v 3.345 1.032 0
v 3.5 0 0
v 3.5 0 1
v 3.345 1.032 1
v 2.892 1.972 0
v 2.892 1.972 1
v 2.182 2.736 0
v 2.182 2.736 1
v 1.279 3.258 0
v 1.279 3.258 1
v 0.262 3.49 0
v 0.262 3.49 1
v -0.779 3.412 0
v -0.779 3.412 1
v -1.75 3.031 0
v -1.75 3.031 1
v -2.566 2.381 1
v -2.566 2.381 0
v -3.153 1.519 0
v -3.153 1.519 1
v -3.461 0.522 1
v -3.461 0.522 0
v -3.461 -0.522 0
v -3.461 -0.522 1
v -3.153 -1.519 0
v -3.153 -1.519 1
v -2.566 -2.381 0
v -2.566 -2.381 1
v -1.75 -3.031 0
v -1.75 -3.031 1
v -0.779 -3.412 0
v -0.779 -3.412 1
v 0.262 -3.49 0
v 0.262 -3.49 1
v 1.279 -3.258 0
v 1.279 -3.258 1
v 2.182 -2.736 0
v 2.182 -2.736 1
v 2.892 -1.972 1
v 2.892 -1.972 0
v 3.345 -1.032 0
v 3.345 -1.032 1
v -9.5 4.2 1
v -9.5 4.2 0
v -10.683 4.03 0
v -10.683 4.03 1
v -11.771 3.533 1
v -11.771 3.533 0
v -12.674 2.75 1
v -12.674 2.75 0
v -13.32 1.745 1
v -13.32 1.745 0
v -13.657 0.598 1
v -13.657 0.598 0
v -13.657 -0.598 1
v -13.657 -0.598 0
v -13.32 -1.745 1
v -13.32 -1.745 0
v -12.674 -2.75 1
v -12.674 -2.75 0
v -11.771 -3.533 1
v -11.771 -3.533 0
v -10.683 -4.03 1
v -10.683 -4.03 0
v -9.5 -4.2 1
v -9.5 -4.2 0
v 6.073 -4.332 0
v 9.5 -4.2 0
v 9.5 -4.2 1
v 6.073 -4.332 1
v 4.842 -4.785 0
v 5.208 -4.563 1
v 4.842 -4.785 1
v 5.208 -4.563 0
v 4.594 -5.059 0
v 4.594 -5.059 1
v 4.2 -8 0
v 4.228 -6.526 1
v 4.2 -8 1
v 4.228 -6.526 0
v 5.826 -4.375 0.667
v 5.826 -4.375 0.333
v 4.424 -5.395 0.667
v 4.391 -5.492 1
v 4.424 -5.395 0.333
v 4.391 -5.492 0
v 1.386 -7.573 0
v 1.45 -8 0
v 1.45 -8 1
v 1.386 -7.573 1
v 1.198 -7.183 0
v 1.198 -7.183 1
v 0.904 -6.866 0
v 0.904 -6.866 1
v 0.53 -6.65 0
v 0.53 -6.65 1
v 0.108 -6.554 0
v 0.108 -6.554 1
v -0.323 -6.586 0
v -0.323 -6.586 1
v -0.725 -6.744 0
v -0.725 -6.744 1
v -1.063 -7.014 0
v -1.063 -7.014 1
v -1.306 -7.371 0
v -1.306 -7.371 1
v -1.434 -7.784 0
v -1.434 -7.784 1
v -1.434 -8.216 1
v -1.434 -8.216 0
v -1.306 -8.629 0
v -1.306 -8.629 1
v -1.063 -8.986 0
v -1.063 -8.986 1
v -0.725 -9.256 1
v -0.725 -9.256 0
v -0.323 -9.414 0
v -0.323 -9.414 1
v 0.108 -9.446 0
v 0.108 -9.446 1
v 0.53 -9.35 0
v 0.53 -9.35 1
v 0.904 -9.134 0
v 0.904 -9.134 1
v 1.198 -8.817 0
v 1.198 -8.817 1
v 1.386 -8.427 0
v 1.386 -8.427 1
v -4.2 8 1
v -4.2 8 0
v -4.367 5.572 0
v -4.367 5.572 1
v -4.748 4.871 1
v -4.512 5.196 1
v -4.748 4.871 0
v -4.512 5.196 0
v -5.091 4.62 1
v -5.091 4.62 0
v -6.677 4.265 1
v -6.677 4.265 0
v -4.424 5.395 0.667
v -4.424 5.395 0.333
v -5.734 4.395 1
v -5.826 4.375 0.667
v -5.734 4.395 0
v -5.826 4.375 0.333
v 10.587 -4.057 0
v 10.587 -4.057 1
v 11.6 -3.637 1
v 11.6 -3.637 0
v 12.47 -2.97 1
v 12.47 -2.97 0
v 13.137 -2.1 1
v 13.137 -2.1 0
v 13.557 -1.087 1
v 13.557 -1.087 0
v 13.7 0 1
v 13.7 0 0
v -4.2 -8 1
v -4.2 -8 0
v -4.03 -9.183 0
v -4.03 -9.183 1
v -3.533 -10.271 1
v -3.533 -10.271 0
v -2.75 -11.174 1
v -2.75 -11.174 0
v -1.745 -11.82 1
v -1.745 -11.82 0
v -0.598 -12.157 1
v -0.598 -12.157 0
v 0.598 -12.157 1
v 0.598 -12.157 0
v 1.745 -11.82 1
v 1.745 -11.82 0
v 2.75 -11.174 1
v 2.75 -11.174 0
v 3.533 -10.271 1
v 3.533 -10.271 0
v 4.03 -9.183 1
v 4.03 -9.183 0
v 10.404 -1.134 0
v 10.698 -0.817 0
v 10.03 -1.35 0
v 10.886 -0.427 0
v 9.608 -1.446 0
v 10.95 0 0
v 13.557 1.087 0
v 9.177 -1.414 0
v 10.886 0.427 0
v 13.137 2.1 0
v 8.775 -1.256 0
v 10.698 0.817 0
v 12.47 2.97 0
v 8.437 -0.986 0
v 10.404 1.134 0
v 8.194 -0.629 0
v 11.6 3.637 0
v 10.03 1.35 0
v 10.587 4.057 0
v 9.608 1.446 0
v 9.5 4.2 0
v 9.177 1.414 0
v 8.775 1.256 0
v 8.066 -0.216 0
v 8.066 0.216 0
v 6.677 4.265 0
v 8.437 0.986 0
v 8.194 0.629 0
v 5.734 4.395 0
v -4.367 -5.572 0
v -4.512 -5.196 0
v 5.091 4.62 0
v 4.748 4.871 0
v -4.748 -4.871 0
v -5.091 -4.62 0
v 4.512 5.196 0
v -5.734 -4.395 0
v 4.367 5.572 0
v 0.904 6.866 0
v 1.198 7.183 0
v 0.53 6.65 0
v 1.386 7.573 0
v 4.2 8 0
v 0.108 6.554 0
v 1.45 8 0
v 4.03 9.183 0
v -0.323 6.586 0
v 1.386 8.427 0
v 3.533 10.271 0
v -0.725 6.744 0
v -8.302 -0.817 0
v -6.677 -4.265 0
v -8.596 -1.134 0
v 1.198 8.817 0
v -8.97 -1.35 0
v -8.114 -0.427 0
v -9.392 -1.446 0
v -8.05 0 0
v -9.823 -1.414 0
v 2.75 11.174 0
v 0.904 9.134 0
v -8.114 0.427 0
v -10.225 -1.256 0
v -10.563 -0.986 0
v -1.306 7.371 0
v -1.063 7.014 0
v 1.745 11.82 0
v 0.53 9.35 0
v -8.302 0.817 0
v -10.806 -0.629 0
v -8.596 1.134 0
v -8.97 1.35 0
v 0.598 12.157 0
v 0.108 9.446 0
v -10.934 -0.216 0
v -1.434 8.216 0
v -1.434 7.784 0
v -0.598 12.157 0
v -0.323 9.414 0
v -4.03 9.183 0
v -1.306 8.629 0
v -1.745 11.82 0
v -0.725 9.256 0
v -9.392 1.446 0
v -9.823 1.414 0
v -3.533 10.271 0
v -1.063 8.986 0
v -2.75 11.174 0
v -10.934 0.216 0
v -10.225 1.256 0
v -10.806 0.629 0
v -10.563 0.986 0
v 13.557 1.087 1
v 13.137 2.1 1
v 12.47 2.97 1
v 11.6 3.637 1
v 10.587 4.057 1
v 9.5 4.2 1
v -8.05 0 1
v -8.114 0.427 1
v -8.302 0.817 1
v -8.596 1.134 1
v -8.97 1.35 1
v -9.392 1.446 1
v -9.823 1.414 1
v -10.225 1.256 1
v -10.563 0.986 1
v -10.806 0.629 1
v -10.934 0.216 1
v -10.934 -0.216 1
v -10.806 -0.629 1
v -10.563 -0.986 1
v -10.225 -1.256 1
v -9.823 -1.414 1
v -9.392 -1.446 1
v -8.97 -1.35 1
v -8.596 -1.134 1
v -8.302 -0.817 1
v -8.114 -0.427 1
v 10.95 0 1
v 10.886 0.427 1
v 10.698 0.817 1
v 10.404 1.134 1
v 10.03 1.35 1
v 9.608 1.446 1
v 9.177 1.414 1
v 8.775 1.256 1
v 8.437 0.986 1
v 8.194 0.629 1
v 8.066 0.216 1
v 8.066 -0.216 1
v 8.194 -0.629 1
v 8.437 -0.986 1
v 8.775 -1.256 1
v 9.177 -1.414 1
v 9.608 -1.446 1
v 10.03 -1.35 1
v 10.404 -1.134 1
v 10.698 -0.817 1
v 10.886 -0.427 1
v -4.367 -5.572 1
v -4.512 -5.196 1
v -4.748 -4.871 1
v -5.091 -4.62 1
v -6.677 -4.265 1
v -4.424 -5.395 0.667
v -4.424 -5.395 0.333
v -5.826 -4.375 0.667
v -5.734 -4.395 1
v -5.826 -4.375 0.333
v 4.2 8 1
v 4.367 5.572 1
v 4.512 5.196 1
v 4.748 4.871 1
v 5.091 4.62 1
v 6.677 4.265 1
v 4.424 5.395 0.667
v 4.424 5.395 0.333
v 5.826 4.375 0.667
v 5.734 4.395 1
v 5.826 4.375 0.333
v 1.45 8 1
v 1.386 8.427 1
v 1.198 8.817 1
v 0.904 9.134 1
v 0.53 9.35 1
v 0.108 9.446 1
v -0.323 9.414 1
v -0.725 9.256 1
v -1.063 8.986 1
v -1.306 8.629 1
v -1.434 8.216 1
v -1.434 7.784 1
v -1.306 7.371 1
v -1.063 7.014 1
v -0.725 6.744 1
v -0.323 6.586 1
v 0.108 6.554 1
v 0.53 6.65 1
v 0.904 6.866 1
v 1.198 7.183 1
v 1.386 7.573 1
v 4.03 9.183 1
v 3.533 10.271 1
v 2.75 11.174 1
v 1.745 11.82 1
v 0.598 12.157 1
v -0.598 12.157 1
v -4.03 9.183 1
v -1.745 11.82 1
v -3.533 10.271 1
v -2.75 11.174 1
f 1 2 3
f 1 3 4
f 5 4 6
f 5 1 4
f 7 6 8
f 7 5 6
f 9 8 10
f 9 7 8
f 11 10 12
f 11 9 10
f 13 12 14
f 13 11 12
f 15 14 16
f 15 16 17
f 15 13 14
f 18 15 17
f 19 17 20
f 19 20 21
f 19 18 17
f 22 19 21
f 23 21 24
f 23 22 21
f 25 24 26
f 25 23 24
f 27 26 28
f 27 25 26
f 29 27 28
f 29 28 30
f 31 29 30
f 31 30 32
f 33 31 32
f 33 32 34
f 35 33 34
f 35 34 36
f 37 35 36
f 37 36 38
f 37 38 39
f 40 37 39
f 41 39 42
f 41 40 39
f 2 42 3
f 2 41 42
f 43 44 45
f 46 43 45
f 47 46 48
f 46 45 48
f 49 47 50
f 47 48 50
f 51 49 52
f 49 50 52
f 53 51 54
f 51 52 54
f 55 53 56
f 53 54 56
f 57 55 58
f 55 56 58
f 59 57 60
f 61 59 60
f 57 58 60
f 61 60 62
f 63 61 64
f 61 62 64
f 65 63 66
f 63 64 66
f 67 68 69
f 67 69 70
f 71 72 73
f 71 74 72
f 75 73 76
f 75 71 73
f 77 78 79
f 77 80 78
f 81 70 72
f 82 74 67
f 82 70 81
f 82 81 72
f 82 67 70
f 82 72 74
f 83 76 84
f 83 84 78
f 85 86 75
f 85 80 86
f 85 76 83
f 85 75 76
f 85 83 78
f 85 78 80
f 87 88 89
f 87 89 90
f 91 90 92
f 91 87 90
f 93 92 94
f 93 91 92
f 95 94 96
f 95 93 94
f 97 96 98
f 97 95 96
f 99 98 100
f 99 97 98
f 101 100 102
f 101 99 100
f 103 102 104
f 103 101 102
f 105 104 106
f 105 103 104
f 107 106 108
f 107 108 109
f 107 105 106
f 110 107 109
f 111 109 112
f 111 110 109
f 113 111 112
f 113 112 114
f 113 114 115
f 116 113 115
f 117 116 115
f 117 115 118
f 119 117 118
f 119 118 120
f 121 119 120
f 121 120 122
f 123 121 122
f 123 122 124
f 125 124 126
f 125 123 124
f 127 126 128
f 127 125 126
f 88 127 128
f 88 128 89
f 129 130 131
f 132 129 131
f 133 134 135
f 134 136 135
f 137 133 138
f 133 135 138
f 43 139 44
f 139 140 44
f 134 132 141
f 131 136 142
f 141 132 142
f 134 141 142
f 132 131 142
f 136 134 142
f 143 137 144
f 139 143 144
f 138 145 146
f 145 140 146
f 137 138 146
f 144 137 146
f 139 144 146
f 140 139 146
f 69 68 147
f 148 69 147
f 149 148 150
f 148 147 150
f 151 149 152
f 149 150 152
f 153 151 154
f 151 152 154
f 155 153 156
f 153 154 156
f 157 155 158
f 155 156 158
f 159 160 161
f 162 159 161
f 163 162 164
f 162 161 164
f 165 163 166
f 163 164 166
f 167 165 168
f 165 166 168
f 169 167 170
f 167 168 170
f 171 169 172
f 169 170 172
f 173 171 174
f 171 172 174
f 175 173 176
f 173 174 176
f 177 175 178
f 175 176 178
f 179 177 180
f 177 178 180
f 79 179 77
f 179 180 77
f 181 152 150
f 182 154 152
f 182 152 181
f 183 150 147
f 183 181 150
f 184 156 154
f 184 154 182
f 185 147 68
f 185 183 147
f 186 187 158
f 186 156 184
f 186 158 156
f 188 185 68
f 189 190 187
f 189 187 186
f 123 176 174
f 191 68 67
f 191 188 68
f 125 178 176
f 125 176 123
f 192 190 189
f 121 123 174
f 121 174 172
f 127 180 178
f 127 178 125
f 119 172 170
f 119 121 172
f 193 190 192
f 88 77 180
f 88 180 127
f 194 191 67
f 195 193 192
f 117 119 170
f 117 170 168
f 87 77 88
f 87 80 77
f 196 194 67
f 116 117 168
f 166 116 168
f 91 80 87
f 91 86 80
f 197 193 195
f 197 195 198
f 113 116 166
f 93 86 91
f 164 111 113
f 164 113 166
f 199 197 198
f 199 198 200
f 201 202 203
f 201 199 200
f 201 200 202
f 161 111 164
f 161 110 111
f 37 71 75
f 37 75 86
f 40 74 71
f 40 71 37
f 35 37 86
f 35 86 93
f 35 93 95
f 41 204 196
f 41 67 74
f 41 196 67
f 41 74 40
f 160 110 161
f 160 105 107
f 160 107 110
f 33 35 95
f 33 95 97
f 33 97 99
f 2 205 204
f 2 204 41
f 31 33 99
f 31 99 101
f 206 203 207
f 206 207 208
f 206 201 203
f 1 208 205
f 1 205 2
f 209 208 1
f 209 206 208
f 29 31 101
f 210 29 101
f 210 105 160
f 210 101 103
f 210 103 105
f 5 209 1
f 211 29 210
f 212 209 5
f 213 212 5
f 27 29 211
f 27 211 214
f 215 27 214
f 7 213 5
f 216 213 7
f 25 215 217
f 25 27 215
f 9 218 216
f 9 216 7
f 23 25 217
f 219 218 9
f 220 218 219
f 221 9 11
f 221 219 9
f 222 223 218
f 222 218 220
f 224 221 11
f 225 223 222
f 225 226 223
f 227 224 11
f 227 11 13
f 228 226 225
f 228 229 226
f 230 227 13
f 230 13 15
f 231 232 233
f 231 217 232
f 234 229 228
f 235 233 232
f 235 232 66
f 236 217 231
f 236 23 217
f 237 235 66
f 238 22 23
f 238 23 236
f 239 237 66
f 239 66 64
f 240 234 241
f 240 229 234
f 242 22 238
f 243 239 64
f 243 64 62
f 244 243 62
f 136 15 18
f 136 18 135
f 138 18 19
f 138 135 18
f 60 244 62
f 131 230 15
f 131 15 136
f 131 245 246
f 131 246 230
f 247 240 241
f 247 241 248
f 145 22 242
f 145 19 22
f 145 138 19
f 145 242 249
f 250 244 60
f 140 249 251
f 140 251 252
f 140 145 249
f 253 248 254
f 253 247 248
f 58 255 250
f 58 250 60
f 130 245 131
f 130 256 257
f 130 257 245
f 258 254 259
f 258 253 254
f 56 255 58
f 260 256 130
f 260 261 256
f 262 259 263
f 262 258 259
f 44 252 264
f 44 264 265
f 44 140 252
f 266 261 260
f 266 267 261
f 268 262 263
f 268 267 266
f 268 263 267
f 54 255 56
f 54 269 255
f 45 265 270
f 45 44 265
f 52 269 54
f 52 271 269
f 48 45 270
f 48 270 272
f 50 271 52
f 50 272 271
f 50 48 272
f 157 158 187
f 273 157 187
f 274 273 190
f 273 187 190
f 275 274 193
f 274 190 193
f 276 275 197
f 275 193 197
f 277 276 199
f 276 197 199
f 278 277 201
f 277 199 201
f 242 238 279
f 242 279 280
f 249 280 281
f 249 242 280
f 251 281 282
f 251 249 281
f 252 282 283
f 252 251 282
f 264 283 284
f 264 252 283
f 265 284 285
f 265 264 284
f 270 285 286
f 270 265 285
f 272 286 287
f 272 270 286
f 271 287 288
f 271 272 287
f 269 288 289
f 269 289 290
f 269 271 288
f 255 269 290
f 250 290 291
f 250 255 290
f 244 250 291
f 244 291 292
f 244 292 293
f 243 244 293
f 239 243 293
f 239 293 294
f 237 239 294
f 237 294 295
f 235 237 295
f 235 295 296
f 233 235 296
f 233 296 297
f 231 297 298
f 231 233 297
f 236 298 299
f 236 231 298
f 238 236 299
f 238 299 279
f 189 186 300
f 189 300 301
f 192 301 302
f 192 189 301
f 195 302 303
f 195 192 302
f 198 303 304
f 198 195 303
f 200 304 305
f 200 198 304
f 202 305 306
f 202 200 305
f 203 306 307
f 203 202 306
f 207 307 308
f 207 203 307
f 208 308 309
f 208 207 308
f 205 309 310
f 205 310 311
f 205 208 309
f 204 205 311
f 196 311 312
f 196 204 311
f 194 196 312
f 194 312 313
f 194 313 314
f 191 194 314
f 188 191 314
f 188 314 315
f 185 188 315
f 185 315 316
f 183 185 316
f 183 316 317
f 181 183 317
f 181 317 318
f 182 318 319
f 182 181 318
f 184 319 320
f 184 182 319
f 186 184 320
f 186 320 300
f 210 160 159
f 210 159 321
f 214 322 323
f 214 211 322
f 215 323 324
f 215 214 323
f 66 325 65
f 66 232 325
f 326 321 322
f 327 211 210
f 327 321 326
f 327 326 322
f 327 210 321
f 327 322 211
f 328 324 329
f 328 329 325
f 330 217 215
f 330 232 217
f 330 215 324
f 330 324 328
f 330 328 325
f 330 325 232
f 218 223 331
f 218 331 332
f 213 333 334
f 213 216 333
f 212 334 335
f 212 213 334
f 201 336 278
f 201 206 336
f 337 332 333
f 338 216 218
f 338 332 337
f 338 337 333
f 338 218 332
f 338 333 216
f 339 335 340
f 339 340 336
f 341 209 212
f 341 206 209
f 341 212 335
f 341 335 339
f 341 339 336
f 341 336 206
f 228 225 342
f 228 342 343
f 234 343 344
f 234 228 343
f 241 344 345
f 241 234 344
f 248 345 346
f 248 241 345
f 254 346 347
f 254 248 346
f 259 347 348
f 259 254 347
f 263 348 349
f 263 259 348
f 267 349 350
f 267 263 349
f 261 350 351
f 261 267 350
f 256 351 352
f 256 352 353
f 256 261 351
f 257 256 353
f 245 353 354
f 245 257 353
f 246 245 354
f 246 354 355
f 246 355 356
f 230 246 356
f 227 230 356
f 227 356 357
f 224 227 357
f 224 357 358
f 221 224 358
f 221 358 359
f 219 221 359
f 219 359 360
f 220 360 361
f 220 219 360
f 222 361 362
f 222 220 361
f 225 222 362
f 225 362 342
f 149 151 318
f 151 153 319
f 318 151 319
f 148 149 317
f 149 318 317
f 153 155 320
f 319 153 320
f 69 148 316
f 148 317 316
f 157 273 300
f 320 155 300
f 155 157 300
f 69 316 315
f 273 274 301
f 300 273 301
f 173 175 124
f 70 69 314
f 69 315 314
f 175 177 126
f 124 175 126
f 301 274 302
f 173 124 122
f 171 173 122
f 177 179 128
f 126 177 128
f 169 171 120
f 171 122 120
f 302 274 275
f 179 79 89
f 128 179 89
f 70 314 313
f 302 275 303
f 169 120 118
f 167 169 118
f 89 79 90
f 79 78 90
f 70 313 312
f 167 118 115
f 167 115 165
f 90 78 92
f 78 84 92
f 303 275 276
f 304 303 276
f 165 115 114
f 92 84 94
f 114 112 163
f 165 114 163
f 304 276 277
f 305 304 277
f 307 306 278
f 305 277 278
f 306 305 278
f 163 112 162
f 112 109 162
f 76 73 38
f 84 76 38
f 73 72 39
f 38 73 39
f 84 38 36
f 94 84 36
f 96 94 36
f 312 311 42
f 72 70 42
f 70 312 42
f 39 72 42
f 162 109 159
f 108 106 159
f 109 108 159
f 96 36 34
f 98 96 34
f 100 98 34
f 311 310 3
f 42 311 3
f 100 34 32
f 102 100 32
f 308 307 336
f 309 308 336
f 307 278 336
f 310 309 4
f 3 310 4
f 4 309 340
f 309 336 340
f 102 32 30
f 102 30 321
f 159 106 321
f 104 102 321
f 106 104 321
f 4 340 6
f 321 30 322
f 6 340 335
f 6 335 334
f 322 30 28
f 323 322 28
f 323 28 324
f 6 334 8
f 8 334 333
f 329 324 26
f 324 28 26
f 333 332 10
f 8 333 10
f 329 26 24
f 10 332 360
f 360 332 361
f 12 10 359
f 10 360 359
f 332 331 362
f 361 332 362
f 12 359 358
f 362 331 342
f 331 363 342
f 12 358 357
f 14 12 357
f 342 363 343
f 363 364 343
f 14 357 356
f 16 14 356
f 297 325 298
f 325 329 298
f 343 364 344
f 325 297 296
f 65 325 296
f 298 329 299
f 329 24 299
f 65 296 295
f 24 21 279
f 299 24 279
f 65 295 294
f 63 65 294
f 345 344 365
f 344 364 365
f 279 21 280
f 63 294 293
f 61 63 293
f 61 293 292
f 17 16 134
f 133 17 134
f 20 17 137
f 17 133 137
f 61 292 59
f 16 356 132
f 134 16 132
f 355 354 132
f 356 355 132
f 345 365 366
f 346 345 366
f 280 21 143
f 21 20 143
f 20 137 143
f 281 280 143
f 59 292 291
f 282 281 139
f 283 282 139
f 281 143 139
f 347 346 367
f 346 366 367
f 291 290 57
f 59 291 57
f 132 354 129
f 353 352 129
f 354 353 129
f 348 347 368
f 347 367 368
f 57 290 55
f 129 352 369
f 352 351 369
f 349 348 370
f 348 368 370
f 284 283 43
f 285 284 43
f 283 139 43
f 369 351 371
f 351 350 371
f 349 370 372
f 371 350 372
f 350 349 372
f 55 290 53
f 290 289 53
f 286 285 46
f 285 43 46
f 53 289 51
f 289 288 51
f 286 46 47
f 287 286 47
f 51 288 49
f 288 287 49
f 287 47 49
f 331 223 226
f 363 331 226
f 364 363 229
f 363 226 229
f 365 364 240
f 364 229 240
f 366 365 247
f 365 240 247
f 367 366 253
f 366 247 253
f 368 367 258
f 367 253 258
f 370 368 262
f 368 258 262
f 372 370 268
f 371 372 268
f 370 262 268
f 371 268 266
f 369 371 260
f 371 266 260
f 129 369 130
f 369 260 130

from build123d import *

# Parameters (mm, degrees)
F1_R     = 3.5
F1_R_2   = 3
F1_R_3   = 1.45
F2_DEPTH = 1


with BuildPart() as f2:
    # F1 (on Top) → F2 (new body)
    with BuildSketch(Plane.XY):
        with BuildLine():
            add(Edge.make_bspline(
                [(4.2, 8), (4.2, 4.3558003341), (4.3243523603, 4.2), (9.5, 4.2)],
                knots=[0, 0, 0, 0, 6.5215028943, 6.5215028943, 6.5215028943, 6.5215028943], degree=3))
            ThreePointArc((4.2, 8), (0, 3.8), (-4.2, 8))
            add(Edge.make_bspline(
                [(-4.2, 8), (-4.2, 4.3558003341), (-4.3243523603, 4.2), (-9.5, 4.2)],
                knots=[0, 0, 0, 0, 6.5215028943, 6.5215028943, 6.5215028943, 6.5215028943], degree=3))
            ThreePointArc((-9.5, 4.2), (-6.530151519, 2.969848481), (-5.3, 0))
            ThreePointArc((-5.3, 0), (-6.530151519, -2.969848481), (-9.5, -4.2))
            add(Edge.make_bspline(
                [(-4.2, -8), (-4.2, -4.3558003341), (-4.3243523603, -4.2), (-9.5, -4.2)],
                knots=[0, 0, 0, 0, 6.5215028943, 6.5215028943, 6.5215028943, 6.5215028943], degree=3))
            ThreePointArc((-4.2, -8), (0, -3.8), (4.2, -8))
            add(Edge.make_bspline(
                [(9.5, -4.2), (4.3243523603, -4.2), (4.2, -4.3558003341), (4.2, -8)],
                knots=[0, 0, 0, 0, 6.5215028943, 6.5215028943, 6.5215028943, 6.5215028943], degree=3))
            ThreePointArc((9.5, -4.2), (5.3, 0), (9.5, 4.2))
        make_face()
        Circle(F1_R, mode=Mode.SUBTRACT)
        with BuildLine():
            ThreePointArc((-5.3, 0), (-6.530151519, 2.969848481), (-9.5, 4.2))
            ThreePointArc((-9.5, 4.2), (-13.7, 0), (-9.5, -4.2))
            ThreePointArc((-9.5, -4.2), (-6.530151519, -2.969848481), (-5.3, 0))
        make_face()
        with Locations((-9.5, 0)):
            Circle(F1_R_2, mode=Mode.SUBTRACT)
        with BuildLine():
            ThreePointArc((-4.2, -8), (0, -12.2), (4.2, -8))
            ThreePointArc((4.2, -8), (0, -3.8), (-4.2, -8))
        make_face()
        with Locations((0, -8)):
            Circle(F1_R_2, mode=Mode.SUBTRACT)
        with BuildLine():
            ThreePointArc((13.7, 0), (12.469848481, 2.969848481), (9.5, 4.2))
            ThreePointArc((9.5, 4.2), (5.3, 0), (9.5, -4.2))
            ThreePointArc((9.5, -4.2), (12.469848481, -2.969848481), (13.7, 0))
        make_face()
        with Locations((9.5, 0)):
            Circle(F1_R_2, mode=Mode.SUBTRACT)
        with BuildLine():
            ThreePointArc((-4.2, 8), (0, 3.8), (4.2, 8))
            ThreePointArc((4.2, 8), (0, 12.2), (-4.2, 8))
        make_face()
        with Locations((0, 8)):
            Circle(F1_R_2, mode=Mode.SUBTRACT)
        with Locations((0, 8)):
            Circle(F1_R_2)
        with Locations((0, 8)):
            Circle(F1_R_3, mode=Mode.SUBTRACT)
        with Locations((-9.5, 0)):
            Circle(F1_R_2)
        with Locations((-9.5, 0)):
            Circle(F1_R_3, mode=Mode.SUBTRACT)
        with Locations((0, -8)):
            Circle(F1_R_2)
        with Locations((0, -8)):
            Circle(F1_R_3, mode=Mode.SUBTRACT)
        with Locations((9.5, 0)):
            Circle(F1_R_2)
        with Locations((9.5, 0)):
            Circle(F1_R_3, mode=Mode.SUBTRACT)
    extrude(amount=F2_DEPTH)


solid = f2.part
